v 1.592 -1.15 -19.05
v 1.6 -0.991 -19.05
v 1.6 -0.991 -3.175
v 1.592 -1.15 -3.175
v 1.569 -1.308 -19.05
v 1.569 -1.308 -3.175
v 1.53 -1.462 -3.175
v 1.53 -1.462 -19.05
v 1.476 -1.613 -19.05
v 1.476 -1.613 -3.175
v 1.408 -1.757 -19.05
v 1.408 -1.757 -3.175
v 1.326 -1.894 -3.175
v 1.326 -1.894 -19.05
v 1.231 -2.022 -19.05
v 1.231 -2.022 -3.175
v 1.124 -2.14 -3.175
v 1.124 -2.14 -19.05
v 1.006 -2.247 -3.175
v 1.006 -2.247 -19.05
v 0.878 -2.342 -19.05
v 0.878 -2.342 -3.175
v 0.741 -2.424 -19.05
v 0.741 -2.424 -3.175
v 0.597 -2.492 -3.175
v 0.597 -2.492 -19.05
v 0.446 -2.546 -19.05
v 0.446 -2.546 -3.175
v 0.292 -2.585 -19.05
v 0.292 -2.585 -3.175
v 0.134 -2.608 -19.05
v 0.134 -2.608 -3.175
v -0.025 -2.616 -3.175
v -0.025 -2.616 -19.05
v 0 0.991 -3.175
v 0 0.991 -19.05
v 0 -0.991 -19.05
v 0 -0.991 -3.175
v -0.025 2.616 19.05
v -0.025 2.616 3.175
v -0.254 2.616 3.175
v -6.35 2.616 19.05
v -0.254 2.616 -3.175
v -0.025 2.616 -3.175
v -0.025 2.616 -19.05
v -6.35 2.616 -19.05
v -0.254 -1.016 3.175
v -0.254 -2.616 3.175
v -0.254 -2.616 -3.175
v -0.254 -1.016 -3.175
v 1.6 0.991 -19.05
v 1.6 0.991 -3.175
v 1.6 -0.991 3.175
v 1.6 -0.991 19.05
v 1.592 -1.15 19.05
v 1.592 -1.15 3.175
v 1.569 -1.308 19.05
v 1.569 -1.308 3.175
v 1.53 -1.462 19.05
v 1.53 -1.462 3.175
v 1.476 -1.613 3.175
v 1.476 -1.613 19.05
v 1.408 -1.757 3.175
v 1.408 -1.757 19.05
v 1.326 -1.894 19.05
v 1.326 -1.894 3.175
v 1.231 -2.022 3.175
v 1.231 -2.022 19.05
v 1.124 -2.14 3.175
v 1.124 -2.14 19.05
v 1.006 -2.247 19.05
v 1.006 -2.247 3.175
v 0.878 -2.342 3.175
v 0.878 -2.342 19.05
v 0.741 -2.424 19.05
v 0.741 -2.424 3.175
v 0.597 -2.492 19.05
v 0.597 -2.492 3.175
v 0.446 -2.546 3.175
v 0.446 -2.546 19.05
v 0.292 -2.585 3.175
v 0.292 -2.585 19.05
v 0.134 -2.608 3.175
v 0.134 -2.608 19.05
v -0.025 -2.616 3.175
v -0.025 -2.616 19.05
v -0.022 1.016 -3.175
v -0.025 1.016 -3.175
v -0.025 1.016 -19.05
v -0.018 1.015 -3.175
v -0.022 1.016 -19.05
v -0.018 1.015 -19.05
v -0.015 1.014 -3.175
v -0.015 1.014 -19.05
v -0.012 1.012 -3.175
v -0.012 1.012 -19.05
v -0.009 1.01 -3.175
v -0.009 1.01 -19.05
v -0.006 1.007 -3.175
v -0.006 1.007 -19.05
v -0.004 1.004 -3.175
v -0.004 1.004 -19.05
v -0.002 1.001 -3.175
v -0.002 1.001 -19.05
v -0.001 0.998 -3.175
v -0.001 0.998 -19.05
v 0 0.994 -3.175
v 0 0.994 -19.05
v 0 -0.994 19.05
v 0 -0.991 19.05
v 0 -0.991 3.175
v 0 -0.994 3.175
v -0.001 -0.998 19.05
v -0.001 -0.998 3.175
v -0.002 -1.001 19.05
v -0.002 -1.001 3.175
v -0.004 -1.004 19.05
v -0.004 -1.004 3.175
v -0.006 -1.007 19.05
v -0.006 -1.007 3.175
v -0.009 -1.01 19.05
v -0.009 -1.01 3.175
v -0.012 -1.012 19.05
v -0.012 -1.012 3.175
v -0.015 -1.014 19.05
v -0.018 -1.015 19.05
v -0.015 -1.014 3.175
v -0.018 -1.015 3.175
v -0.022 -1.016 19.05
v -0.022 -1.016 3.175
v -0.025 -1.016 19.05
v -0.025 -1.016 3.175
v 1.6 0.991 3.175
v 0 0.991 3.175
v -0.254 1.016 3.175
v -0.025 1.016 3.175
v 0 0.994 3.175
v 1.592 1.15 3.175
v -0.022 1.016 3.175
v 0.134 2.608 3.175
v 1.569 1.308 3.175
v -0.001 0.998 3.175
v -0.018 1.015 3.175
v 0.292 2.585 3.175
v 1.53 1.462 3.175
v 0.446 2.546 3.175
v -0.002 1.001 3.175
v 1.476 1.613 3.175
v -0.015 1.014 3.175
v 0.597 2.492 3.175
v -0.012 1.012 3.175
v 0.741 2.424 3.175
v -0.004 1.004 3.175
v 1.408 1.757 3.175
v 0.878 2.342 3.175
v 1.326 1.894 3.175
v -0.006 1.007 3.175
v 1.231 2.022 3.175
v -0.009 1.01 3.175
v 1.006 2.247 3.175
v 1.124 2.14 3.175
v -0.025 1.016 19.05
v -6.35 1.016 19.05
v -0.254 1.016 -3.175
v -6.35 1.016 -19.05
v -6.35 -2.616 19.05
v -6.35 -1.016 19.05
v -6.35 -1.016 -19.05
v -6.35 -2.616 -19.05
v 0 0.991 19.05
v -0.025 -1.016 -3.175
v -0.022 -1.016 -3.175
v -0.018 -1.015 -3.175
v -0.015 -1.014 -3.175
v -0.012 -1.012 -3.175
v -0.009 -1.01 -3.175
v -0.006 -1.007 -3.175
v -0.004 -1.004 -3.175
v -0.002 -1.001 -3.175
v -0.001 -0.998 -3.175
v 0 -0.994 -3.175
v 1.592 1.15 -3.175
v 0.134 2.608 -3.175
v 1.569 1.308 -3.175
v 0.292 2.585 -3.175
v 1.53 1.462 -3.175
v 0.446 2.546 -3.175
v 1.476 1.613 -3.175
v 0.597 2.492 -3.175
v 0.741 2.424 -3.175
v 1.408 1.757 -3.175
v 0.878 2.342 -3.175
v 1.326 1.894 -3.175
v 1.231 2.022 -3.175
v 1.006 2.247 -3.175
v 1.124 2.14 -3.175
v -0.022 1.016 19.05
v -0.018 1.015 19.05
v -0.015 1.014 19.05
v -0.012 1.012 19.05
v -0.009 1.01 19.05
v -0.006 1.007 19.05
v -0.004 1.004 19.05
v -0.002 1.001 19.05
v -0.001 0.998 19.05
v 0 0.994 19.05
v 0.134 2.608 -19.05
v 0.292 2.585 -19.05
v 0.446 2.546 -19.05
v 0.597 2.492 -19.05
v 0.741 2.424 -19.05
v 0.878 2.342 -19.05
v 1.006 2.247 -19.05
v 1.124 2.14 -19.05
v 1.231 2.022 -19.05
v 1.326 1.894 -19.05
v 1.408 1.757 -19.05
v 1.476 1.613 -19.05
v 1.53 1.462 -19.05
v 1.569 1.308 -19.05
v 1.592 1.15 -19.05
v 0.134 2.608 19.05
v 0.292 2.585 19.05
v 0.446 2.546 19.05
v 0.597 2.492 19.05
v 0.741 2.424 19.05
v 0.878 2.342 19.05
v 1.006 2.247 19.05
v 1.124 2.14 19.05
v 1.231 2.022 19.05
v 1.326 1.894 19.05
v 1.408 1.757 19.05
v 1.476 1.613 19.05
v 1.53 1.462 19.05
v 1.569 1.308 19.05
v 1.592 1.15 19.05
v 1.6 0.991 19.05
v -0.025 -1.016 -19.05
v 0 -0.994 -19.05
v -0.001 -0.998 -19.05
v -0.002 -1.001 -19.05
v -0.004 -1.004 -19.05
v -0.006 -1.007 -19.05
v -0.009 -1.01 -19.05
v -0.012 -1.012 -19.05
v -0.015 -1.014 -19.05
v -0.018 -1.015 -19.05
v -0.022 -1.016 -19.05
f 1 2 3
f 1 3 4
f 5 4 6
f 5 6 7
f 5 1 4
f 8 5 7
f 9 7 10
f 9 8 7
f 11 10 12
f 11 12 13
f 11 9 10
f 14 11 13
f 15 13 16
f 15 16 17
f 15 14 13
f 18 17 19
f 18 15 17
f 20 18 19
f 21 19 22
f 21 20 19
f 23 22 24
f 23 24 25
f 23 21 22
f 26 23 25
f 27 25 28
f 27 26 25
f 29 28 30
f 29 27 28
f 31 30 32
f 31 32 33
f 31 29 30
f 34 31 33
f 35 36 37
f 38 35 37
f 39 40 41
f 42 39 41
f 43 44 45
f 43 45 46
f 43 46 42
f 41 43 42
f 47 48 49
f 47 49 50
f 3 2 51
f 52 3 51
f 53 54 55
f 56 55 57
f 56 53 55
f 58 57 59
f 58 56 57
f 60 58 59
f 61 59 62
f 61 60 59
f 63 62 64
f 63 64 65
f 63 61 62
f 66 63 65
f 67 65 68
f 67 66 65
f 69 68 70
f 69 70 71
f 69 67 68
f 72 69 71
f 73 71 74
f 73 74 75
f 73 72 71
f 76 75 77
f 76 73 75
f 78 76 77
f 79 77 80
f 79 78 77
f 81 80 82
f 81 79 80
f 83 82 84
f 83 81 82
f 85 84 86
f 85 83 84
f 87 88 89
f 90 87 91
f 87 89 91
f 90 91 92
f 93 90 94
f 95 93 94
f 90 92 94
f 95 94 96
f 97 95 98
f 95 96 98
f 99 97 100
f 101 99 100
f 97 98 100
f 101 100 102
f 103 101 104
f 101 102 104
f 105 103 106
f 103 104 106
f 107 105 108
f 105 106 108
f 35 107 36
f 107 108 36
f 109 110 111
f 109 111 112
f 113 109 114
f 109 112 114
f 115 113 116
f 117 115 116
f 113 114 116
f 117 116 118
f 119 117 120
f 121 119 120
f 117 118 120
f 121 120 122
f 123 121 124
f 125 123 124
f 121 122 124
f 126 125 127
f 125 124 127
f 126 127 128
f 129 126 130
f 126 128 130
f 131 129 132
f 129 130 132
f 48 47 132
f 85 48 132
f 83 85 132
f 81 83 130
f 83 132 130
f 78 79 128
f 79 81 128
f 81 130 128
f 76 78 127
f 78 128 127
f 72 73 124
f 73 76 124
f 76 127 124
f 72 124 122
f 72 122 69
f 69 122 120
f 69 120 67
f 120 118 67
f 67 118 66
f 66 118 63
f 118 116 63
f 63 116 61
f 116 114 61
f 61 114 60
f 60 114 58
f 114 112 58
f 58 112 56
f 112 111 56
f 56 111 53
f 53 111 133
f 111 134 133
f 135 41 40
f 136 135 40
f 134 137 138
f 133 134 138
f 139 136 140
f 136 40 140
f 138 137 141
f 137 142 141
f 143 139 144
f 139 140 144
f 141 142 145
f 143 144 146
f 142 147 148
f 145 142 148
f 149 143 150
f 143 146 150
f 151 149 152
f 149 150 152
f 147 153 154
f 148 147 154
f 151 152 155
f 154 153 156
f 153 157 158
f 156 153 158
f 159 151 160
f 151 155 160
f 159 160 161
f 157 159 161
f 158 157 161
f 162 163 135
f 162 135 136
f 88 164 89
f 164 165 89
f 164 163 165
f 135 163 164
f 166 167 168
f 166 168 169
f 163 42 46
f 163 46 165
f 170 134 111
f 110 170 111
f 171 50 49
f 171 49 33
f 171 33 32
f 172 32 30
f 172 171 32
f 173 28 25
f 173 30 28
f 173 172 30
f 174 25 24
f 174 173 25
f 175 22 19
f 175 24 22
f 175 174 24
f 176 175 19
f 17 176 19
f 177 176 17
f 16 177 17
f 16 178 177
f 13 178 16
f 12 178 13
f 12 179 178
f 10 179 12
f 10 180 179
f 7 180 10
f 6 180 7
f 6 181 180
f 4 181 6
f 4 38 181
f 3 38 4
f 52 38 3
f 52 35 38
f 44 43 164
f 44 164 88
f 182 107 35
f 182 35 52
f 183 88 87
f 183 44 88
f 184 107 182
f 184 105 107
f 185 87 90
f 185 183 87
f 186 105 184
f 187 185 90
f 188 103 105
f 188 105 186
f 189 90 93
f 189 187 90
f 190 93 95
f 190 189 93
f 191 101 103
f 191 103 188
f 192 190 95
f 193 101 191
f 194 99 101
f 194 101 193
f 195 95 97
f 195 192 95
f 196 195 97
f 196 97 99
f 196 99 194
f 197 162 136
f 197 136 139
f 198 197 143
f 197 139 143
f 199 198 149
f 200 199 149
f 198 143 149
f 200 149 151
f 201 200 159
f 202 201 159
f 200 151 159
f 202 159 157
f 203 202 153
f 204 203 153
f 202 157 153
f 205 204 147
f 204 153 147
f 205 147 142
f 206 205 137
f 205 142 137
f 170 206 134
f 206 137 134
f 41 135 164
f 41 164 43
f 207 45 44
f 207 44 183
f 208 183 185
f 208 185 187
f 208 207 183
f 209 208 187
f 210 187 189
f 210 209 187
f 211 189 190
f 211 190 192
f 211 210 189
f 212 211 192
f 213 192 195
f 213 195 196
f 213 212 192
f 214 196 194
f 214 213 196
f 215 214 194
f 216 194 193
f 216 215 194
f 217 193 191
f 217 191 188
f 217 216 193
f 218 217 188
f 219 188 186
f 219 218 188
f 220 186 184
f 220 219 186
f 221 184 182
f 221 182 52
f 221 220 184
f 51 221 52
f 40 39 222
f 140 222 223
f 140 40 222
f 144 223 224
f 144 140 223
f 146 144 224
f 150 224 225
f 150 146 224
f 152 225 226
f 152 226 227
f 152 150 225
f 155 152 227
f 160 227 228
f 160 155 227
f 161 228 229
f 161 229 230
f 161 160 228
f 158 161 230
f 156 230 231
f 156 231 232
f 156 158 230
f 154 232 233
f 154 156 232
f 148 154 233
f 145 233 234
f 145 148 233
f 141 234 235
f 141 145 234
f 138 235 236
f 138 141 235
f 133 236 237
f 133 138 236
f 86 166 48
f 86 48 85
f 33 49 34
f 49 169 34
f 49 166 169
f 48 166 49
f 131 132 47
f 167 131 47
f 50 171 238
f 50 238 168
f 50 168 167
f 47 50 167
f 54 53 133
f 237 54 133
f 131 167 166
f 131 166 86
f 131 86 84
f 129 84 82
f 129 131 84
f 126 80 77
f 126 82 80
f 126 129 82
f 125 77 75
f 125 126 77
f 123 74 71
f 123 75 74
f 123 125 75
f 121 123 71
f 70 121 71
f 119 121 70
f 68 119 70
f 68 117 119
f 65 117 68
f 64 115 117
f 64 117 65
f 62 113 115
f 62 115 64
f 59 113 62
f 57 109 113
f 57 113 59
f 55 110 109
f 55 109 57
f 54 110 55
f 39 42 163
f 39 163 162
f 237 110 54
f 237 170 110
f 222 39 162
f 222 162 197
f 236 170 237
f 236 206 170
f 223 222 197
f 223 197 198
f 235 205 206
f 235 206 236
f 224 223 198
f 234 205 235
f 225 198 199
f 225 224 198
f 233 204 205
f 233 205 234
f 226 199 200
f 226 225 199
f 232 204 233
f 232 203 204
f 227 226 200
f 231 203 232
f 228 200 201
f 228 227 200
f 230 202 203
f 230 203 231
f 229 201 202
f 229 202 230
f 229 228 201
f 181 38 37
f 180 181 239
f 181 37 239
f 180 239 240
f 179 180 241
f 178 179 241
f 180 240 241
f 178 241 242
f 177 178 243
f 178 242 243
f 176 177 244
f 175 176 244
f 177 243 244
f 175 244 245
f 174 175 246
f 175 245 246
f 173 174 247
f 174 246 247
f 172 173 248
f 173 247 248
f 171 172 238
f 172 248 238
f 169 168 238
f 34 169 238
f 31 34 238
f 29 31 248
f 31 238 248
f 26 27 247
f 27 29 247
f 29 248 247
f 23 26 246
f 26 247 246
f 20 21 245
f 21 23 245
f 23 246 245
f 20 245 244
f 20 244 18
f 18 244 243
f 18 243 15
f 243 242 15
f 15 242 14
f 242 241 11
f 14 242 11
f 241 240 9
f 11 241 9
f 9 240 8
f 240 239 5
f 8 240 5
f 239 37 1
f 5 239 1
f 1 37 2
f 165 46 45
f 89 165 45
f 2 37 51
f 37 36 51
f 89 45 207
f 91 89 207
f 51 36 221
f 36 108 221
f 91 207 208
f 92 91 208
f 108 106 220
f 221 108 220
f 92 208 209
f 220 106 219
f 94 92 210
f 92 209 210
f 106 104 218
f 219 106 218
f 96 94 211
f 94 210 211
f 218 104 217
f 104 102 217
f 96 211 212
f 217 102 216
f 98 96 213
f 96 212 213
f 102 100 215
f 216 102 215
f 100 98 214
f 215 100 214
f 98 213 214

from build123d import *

# Parameters (mm, degrees)
BOSS_EXTRUDE1_DEPTH    = 19.05
CONVERT_SOLID1_START   = -19.05
CONVERT_SOLID1_DEPTH   = 38.1
CONVERT_SOLID1_2_DEPTH = 38.1
SKETCH2_W              = 1.8542
SKETCH2_H              = 5.2324
CUT_EXTRUDE1_DEPTH     = 3.175


# Read off the part's stored shape, not the designer's step: SharpBend1
with BuildPart() as part:
    # Sketch1 → Boss-Extrude1 (new, symmetric)
    with BuildSketch(Plane(origin=(0, 0, 0), x_dir=(1, 0, 0), z_dir=(0, 0, -1))):
        Polygon((1.6002, -2.6162), (-6.35, -2.6162), (-6.35, -1.016), (0, -1.016), (0, 1.016), (-6.35, 1.016), (-6.35, 2.6162), (1.6002, 2.6162), align=None)
    extrude(amount=BOSS_EXTRUDE1_DEPTH, both=True)

    # Convert-Solid1 outline → Convert-Solid1 (cut)
    with BuildSketch(Plane.XY.offset(CONVERT_SOLID1_START)):
        with BuildLine():
            Line((1.6002, -2.6162), (1.6002, -0.9906))
            ThreePointArc((1.6002, -0.9906), (1.124072783, -2.140072783), (-0.0254, -2.6162))
            Line((-0.0254, -2.6162), (1.6002, -2.6162))
        make_face()
        with BuildLine():
            ThreePointArc((-0.0254, 2.6162), (1.124072783, 2.140072783), (1.6002, 0.9906))
            Line((1.6002, 0.9906), (1.6002, 2.6162))
            Line((1.6002, 2.6162), (-0.0254, 2.6162))
        make_face()
    extrude(amount=CONVERT_SOLID1_DEPTH, mode=Mode.SUBTRACT)

    # Convert-Solid1 2 outline → Convert-Solid1 2 (add)
    with BuildSketch(Plane.XY.offset(CONVERT_SOLID1_START)):
        with BuildLine():
            Line((0, -1.016), (0, -0.9906))
            ThreePointArc((0, -0.9906), (-0.007439488, -1.008560512), (-0.0254, -1.016))
            Line((-0.0254, -1.016), (0, -1.016))
        make_face()
        with BuildLine():
            ThreePointArc((-0.0254, 1.016), (-0.007439488, 1.008560512), (0, 0.9906))
            Line((0, 0.9906), (0, 1.016))
            Line((0, 1.016), (-0.0254, 1.016))
        make_face()
    extrude(amount=CONVERT_SOLID1_2_DEPTH)

    # Sketch2 → Cut-Extrude1 (cut, symmetric)
    with BuildSketch(Plane.XY):
        with Locations((0.6731, 0)):
            Rectangle(SKETCH2_W, SKETCH2_H)
    extrude(amount=CUT_EXTRUDE1_DEPTH, both=True, mode=Mode.SUBTRACT)


solid = part.part
